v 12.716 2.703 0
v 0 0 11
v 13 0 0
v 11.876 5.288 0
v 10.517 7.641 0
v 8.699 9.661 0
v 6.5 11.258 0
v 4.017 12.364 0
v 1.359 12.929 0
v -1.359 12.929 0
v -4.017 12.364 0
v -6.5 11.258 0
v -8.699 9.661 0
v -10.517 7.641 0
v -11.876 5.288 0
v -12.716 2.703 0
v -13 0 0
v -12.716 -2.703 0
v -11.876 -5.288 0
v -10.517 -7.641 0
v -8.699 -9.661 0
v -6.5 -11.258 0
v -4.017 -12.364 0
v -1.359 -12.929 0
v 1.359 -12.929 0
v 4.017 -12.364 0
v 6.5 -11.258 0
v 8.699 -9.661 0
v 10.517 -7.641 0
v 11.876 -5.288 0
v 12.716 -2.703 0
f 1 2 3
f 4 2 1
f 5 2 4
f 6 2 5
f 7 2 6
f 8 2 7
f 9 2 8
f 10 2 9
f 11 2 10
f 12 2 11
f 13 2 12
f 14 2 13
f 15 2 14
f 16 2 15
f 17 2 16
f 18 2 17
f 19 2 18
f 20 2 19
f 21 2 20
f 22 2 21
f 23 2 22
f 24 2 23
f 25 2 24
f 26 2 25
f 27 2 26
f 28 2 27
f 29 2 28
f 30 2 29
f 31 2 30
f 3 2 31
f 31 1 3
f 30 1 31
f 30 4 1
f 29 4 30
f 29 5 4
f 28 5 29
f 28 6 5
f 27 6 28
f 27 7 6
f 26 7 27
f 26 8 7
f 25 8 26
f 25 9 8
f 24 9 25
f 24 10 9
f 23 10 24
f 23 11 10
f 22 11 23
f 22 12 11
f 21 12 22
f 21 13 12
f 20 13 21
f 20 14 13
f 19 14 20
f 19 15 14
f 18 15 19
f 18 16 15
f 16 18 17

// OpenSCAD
// Generated by SolidPython 1.0.1 on 2020-07-29 00:39:25


cylinder(h = 11, r1 = 13, r2 = 0);
/***********************************************
*********      SolidPython code:      **********
************************************************
 
# import packages: SolidPython
from solid import *
from solid.utils import *
from itertools import chain, combinations


class Resize:

    def __init__(self, scad_file):
        self.scad_file = scad_file
        #self.scad_file = import_scad(scad_file)
        # cone/cylinder param:
        self.r1 = 0
        self.r2 = 0
        self.h = 0
        # rectangular prism param:
        self.w = 0
        self.l = 0
        # ellipse param:
        self.r = 0

    # import OpenScad code (file name corresponds to shape)


    # classify shape + parameters
    def assign(self, param1, param2, param3):
        if self.scad_file == 'cone.scad':
            self.r1 = param1
            self.r2 = param2
            self.h = param3
        elif self.scad_file == 'cylinder.scad':
            self.r1 = param1
            self.r2 = param2
            self.h = param3
        elif self.scad_file == 'rectangularPrism.scad':
            self.h = param1
            self.l = param2
            self.w = param3
        else:
            self.r = param1
            self.h = param2

    # resize parameters
    def iterate(self):
        x = range(3, 20, 2)
        i = 1
        if self.scad_file == 'cone.scad':
            tempList = list(combinations(x, 2))
            for temp in tempList:
                param1 = temp[0]
                param2 = temp[1]
                filepath = 'produced_scad_files/' + 'cone' + str(param1) + '_' + str(param2) + '_' + '.scad'
                scad_render_to_file(cylinder(h=param1, r1=param2, r2=0), filepath)

        elif self.scad_file == 'cylinder.scad':
            tempList = list(combinations(x, 3))
            for temp in tempList:
                param1 = temp[0]
                param2 = temp[1]
                filepath = 'produced_scad_files/' + 'cylinder' + str(param1) + '_' + str(param2) + '_' + '.scad'
                scad_render_to_file(cylinder(h=param1, r1=param2, r2=param2), filepath)

        elif self.scad_file == 'rectangularPrism.scad':
            tempList = list(combinations(x, 3))
            for temp in tempList:
                param1 = temp[0]
                param2 = temp[1]
                param3 = temp[2]
                filepath = 'produced_scad_files/' + 'rectangularPrism' + str(param1) + '_' + str(param2) + '_' + str(
                    param3) + '.scad'
                scad_render_to_file(cube(size=(param1, param2, param3)), filepath)

        elif self.scad_file == 'ellipse.scad':
            tempList = list(combinations(x, 4))
            for temp in tempList:
                param1 = temp[0]
                param2 = temp[1]
                param3 = temp[2]
                param4 = temp[3]
                filepath = 'produced_scad_files/' + 'ellipse' + str(param1) + '_' + str(param2) + '_' + str(param3) + '_' + str(param4) + '.scad'
                scad_render_to_file(scale([param1, param2, param3])(sphere(r=param4)), filepath)

    def render_to_scadfile(self):
        scad_render_to_file(scad, 'example.scad') 
 
************************************************/
